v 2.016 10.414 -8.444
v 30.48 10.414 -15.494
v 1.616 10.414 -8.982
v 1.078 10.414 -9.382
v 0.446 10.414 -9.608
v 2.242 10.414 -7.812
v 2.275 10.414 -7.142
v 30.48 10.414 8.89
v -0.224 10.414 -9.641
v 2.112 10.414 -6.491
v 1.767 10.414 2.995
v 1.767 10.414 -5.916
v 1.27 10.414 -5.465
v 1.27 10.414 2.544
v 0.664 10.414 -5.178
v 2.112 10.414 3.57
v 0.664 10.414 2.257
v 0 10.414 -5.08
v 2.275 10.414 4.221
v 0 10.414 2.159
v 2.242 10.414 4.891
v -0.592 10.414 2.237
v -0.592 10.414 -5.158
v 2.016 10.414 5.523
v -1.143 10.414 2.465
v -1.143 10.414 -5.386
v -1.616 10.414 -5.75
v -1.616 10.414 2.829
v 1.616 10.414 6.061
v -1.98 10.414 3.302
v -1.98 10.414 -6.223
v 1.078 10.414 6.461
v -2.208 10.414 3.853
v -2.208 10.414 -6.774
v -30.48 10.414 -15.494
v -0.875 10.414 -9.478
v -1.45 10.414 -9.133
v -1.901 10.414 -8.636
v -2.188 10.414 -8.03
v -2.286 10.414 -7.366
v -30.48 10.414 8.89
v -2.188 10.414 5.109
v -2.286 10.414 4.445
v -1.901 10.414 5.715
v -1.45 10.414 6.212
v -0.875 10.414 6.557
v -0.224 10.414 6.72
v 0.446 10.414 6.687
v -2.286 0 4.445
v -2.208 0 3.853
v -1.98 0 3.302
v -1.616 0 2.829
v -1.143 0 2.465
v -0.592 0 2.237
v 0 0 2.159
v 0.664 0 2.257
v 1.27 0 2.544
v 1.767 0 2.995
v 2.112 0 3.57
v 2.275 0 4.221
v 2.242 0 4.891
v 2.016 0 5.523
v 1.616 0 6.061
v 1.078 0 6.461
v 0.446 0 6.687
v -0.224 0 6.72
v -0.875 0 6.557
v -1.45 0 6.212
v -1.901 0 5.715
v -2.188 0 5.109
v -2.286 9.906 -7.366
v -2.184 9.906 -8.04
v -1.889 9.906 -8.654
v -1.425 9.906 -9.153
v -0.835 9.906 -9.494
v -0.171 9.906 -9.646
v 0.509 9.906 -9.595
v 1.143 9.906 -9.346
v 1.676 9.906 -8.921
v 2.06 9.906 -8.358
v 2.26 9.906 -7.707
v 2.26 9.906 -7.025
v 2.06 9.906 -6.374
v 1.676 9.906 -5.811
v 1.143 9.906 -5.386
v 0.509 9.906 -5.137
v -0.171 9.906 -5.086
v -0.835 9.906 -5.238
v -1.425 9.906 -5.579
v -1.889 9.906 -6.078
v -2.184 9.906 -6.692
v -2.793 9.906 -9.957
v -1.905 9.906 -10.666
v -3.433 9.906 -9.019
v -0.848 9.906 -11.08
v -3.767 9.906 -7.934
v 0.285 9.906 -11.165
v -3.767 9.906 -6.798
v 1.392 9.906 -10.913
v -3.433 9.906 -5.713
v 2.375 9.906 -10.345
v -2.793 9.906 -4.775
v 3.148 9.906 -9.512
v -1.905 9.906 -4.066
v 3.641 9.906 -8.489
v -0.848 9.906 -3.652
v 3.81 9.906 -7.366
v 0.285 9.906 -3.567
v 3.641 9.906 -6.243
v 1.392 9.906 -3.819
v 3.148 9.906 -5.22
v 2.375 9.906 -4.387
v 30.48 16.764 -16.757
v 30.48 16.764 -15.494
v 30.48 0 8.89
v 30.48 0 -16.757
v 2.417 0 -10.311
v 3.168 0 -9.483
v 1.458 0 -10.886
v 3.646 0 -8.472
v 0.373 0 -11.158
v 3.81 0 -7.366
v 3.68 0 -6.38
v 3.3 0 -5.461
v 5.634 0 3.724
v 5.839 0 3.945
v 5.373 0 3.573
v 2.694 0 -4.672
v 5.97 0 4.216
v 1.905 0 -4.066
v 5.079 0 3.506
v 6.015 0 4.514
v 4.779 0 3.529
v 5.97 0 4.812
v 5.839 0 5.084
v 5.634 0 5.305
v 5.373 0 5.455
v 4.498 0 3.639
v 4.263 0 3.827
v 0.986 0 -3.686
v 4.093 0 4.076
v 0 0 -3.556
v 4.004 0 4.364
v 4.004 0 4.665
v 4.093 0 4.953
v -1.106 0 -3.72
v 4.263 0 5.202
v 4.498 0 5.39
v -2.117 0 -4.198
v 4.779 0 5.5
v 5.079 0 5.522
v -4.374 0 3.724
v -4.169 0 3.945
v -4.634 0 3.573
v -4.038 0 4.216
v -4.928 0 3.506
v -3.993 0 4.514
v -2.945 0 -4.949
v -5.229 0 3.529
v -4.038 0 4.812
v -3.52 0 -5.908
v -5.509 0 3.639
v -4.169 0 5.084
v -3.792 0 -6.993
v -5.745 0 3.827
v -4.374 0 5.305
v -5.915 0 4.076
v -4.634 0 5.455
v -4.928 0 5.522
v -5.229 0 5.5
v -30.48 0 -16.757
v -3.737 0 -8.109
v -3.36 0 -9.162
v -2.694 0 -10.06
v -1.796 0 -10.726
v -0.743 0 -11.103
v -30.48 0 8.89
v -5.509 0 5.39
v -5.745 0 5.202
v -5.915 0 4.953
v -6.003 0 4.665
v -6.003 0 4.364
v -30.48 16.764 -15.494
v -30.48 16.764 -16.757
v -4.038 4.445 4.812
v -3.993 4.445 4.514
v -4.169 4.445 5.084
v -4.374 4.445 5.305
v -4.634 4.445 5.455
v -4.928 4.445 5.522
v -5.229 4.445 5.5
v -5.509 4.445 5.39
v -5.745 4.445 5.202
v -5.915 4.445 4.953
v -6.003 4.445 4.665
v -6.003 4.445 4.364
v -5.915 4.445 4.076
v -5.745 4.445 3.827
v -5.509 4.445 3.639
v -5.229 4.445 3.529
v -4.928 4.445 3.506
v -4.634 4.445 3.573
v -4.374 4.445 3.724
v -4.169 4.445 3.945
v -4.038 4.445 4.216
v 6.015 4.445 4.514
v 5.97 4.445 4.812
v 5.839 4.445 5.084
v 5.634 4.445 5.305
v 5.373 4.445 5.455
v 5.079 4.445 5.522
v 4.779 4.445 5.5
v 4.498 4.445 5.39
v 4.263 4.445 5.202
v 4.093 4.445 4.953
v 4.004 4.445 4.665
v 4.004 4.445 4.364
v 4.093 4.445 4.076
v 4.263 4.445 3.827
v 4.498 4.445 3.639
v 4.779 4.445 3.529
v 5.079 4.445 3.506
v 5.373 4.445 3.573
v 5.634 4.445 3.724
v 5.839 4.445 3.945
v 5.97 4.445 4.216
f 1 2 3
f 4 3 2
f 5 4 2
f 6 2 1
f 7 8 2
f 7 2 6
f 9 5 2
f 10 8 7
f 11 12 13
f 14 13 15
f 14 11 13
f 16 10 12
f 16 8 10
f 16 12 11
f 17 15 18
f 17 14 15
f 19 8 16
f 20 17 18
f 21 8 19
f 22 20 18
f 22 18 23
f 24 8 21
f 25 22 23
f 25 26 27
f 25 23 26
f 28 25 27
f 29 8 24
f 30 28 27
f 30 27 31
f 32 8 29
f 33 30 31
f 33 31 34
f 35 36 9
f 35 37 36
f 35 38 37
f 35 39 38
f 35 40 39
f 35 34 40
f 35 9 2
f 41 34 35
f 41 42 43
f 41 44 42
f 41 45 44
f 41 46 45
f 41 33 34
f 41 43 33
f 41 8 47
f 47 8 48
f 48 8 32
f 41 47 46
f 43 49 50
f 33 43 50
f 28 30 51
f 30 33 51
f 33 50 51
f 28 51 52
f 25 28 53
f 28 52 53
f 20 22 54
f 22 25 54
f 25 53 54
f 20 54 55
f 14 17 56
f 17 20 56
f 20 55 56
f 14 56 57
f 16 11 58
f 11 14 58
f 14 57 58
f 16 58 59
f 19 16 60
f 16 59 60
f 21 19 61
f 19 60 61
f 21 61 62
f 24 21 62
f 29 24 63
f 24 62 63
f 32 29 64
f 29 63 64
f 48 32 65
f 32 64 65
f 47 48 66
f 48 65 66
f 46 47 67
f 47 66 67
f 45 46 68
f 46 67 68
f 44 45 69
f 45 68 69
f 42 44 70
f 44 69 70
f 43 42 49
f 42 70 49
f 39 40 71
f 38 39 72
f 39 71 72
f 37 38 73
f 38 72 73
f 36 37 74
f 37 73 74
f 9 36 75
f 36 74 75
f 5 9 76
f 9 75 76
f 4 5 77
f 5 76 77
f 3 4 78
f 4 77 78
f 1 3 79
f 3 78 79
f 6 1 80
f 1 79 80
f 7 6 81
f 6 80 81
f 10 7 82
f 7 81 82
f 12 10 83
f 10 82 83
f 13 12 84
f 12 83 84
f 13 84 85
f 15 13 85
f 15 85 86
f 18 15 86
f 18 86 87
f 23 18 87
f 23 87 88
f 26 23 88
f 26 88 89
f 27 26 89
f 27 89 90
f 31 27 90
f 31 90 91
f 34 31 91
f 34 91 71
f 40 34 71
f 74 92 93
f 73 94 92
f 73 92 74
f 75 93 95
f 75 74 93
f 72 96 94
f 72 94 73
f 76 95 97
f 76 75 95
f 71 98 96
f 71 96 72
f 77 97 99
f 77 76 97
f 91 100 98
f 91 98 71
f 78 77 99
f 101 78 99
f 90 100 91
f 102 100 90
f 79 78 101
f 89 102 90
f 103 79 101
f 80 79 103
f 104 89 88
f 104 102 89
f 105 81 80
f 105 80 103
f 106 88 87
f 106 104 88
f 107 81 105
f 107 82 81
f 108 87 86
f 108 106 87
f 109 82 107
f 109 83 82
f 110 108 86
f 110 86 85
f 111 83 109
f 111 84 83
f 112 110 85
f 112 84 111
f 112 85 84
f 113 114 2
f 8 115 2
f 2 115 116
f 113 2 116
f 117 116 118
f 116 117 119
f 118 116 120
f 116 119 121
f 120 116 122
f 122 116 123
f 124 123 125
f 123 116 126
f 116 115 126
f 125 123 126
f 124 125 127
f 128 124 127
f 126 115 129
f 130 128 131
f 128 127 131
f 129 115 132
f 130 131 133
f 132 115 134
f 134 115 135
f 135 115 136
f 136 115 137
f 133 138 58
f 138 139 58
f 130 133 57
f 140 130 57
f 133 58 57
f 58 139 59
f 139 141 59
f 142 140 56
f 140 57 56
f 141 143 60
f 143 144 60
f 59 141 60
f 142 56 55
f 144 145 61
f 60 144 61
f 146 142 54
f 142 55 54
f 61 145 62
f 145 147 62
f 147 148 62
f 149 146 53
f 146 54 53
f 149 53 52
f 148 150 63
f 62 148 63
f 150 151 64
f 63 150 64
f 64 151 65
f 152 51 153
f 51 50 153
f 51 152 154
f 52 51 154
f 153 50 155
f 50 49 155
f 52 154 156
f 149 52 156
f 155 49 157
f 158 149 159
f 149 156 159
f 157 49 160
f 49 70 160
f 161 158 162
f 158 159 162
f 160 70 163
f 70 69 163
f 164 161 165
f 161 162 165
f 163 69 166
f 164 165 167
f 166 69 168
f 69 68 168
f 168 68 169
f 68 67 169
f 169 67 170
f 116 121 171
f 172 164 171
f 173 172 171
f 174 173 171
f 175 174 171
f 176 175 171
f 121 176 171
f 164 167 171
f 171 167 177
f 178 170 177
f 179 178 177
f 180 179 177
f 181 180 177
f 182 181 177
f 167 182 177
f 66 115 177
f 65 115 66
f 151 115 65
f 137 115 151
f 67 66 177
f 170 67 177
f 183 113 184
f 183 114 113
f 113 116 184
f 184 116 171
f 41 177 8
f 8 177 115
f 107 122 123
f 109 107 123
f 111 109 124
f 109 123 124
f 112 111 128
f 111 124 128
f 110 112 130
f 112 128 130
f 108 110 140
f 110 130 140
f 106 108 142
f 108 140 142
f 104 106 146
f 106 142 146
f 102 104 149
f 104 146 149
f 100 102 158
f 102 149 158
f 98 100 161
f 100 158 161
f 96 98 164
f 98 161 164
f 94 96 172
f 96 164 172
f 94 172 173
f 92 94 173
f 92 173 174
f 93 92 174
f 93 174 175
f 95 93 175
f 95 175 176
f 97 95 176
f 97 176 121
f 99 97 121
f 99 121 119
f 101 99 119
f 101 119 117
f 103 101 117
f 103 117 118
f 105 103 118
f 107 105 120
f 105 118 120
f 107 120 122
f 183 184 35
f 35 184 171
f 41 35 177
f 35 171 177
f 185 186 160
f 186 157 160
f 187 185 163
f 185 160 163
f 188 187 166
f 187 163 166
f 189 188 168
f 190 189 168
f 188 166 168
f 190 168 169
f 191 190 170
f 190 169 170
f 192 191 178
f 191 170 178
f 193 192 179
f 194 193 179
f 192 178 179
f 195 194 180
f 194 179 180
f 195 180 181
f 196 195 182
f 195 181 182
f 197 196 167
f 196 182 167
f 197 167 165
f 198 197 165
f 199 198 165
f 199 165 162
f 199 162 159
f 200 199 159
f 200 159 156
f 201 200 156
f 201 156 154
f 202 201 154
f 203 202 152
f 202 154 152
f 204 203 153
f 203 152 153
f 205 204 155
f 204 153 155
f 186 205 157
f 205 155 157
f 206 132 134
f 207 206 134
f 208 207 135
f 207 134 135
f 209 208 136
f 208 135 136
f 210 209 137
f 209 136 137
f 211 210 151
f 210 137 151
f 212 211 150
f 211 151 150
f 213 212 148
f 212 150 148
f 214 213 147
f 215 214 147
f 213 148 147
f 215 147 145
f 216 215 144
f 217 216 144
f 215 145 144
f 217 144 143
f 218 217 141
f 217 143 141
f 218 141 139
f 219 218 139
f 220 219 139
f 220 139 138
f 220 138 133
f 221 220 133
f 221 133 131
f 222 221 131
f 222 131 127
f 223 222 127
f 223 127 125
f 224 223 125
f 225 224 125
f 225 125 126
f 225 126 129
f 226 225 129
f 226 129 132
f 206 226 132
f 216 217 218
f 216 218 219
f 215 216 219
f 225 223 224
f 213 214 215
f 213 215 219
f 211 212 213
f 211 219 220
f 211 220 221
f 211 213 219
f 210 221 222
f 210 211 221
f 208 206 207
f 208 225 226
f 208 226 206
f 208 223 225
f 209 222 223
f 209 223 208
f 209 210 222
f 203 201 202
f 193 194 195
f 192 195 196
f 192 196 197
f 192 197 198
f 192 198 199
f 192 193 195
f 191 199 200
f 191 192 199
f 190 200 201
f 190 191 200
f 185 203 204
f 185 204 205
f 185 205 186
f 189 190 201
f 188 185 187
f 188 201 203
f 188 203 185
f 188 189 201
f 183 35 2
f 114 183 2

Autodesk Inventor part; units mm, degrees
ref_plane "YZ Plane" through (0, 0, 0) normal (1, 0, 0) x (0, 1, 0)
ref_plane "XZ Plane" through (0, 0, 0) normal (0, 1, 0) x (-1, 0, 0)
ref_plane "XY Plane" through (0, 0, 0) normal (0, 0, 1) x (1, 0, 0)
sketch "Sketch1" plane through (0, 0, 0) normal (0, 1, 0) x (-1, 0, 0)
  line L0 (0, 0) -> (30.48, 0)
  line L1 (30.48, 0) -> (-30.48, 0)
  line L2 (-30.48, 0) -> (-30.48, -15.748)
  line L3 (-30.48, -15.748) -> (30.48, -15.748)
  line L4 (30.48, -15.748) -> (30.48, 0)
  line L5 (30.48, -15.748) -> (30.48, -15.494)
  line L6 (30.48, -15.494) -> (-30.48, -15.494)
  line L7 (0, 0) -> (0, -7.366)
  circle A0 centre (0, -7.366) radius 2.286
  line L8 (30.48, 0) -> (30.48, 8.89)
  line L9 (30.48, 8.89) -> (-30.48, 8.89)
  line L10 (-30.48, 8.89) -> (-30.48, 0)
  line L11 (30.48, 0) -> (-30.48, 0)
  line L12 (0, 0) -> (0, 4.445)
  circle A1 centre (0, 4.445) radius 2.286
  line L13 (30.48, -15.748) -> (-30.48, -15.748)
  line L14 (-30.48, -15.748) -> (-30.48, -16.7568)
  line L15 (-30.48, -16.7568) -> (30.48, -16.7568)
  line L16 (30.48, -16.7568) -> (30.48, -15.748)
  dimension "d0" = 30.48
  dimension "d1" = 60.96
  dimension "d2" = 15.748
  dimension "d3" = 0.254
  dimension "d4" = 7.366
  dimension "d5" = 4.572
  dimension "d14" = 8.89
  dimension "d15" = 4.572
extrude "Extrusion1" add sketch "Sketch1" along normal blind 10.414 contours L0 L4 L6 L2 L1
extrude "Extrusion2" add sketch "Sketch1" along normal blind 16.764 contours L4 L3 L2 L6 | L16 L15 L14 L3
sketch "Sketch2" plane through (0, 0, 0) normal (0, -1, 0) x (1, 0, 0)
  line L0 (0, 0) -> (0, -7.366)
  circle A0 centre (0, -7.366) radius 3.81
  dimension "d10" = 7.366
  dimension "d11" = 7.62
extrude "Extrusion3" cut sketch "Sketch2" against normal blind 9.906
extrude "Extrusion4" add sketch "Sketch1" along normal blind 10.414 contours L1 L10 L9 L8 L0
sketch "Sketch3" plane through (0, 0, 0) normal (0, -1, 0) x (1, 0, 0)
  line L0 (0, 4.5142) -> (5.0038, 4.5142)
  line L1 (0, 4.5142) -> (-5.0038, 4.5142)
  circle A0 centre (5.0038, 4.5142) radius 1.0109
  circle A1 centre (-5.0038, 4.5142) radius 1.0109
  point P0 (0, 0)
  dimension "d18" = 5.0038
  dimension "d19" = 5.0038
  dimension "d20" = 2.0218
  dimension "d21" = 2.0218
extrude "Extrusion5" cut sketch "Sketch3" against normal blind 4.445
properties part number "RotationMounttoPolarisPinAdapter"
